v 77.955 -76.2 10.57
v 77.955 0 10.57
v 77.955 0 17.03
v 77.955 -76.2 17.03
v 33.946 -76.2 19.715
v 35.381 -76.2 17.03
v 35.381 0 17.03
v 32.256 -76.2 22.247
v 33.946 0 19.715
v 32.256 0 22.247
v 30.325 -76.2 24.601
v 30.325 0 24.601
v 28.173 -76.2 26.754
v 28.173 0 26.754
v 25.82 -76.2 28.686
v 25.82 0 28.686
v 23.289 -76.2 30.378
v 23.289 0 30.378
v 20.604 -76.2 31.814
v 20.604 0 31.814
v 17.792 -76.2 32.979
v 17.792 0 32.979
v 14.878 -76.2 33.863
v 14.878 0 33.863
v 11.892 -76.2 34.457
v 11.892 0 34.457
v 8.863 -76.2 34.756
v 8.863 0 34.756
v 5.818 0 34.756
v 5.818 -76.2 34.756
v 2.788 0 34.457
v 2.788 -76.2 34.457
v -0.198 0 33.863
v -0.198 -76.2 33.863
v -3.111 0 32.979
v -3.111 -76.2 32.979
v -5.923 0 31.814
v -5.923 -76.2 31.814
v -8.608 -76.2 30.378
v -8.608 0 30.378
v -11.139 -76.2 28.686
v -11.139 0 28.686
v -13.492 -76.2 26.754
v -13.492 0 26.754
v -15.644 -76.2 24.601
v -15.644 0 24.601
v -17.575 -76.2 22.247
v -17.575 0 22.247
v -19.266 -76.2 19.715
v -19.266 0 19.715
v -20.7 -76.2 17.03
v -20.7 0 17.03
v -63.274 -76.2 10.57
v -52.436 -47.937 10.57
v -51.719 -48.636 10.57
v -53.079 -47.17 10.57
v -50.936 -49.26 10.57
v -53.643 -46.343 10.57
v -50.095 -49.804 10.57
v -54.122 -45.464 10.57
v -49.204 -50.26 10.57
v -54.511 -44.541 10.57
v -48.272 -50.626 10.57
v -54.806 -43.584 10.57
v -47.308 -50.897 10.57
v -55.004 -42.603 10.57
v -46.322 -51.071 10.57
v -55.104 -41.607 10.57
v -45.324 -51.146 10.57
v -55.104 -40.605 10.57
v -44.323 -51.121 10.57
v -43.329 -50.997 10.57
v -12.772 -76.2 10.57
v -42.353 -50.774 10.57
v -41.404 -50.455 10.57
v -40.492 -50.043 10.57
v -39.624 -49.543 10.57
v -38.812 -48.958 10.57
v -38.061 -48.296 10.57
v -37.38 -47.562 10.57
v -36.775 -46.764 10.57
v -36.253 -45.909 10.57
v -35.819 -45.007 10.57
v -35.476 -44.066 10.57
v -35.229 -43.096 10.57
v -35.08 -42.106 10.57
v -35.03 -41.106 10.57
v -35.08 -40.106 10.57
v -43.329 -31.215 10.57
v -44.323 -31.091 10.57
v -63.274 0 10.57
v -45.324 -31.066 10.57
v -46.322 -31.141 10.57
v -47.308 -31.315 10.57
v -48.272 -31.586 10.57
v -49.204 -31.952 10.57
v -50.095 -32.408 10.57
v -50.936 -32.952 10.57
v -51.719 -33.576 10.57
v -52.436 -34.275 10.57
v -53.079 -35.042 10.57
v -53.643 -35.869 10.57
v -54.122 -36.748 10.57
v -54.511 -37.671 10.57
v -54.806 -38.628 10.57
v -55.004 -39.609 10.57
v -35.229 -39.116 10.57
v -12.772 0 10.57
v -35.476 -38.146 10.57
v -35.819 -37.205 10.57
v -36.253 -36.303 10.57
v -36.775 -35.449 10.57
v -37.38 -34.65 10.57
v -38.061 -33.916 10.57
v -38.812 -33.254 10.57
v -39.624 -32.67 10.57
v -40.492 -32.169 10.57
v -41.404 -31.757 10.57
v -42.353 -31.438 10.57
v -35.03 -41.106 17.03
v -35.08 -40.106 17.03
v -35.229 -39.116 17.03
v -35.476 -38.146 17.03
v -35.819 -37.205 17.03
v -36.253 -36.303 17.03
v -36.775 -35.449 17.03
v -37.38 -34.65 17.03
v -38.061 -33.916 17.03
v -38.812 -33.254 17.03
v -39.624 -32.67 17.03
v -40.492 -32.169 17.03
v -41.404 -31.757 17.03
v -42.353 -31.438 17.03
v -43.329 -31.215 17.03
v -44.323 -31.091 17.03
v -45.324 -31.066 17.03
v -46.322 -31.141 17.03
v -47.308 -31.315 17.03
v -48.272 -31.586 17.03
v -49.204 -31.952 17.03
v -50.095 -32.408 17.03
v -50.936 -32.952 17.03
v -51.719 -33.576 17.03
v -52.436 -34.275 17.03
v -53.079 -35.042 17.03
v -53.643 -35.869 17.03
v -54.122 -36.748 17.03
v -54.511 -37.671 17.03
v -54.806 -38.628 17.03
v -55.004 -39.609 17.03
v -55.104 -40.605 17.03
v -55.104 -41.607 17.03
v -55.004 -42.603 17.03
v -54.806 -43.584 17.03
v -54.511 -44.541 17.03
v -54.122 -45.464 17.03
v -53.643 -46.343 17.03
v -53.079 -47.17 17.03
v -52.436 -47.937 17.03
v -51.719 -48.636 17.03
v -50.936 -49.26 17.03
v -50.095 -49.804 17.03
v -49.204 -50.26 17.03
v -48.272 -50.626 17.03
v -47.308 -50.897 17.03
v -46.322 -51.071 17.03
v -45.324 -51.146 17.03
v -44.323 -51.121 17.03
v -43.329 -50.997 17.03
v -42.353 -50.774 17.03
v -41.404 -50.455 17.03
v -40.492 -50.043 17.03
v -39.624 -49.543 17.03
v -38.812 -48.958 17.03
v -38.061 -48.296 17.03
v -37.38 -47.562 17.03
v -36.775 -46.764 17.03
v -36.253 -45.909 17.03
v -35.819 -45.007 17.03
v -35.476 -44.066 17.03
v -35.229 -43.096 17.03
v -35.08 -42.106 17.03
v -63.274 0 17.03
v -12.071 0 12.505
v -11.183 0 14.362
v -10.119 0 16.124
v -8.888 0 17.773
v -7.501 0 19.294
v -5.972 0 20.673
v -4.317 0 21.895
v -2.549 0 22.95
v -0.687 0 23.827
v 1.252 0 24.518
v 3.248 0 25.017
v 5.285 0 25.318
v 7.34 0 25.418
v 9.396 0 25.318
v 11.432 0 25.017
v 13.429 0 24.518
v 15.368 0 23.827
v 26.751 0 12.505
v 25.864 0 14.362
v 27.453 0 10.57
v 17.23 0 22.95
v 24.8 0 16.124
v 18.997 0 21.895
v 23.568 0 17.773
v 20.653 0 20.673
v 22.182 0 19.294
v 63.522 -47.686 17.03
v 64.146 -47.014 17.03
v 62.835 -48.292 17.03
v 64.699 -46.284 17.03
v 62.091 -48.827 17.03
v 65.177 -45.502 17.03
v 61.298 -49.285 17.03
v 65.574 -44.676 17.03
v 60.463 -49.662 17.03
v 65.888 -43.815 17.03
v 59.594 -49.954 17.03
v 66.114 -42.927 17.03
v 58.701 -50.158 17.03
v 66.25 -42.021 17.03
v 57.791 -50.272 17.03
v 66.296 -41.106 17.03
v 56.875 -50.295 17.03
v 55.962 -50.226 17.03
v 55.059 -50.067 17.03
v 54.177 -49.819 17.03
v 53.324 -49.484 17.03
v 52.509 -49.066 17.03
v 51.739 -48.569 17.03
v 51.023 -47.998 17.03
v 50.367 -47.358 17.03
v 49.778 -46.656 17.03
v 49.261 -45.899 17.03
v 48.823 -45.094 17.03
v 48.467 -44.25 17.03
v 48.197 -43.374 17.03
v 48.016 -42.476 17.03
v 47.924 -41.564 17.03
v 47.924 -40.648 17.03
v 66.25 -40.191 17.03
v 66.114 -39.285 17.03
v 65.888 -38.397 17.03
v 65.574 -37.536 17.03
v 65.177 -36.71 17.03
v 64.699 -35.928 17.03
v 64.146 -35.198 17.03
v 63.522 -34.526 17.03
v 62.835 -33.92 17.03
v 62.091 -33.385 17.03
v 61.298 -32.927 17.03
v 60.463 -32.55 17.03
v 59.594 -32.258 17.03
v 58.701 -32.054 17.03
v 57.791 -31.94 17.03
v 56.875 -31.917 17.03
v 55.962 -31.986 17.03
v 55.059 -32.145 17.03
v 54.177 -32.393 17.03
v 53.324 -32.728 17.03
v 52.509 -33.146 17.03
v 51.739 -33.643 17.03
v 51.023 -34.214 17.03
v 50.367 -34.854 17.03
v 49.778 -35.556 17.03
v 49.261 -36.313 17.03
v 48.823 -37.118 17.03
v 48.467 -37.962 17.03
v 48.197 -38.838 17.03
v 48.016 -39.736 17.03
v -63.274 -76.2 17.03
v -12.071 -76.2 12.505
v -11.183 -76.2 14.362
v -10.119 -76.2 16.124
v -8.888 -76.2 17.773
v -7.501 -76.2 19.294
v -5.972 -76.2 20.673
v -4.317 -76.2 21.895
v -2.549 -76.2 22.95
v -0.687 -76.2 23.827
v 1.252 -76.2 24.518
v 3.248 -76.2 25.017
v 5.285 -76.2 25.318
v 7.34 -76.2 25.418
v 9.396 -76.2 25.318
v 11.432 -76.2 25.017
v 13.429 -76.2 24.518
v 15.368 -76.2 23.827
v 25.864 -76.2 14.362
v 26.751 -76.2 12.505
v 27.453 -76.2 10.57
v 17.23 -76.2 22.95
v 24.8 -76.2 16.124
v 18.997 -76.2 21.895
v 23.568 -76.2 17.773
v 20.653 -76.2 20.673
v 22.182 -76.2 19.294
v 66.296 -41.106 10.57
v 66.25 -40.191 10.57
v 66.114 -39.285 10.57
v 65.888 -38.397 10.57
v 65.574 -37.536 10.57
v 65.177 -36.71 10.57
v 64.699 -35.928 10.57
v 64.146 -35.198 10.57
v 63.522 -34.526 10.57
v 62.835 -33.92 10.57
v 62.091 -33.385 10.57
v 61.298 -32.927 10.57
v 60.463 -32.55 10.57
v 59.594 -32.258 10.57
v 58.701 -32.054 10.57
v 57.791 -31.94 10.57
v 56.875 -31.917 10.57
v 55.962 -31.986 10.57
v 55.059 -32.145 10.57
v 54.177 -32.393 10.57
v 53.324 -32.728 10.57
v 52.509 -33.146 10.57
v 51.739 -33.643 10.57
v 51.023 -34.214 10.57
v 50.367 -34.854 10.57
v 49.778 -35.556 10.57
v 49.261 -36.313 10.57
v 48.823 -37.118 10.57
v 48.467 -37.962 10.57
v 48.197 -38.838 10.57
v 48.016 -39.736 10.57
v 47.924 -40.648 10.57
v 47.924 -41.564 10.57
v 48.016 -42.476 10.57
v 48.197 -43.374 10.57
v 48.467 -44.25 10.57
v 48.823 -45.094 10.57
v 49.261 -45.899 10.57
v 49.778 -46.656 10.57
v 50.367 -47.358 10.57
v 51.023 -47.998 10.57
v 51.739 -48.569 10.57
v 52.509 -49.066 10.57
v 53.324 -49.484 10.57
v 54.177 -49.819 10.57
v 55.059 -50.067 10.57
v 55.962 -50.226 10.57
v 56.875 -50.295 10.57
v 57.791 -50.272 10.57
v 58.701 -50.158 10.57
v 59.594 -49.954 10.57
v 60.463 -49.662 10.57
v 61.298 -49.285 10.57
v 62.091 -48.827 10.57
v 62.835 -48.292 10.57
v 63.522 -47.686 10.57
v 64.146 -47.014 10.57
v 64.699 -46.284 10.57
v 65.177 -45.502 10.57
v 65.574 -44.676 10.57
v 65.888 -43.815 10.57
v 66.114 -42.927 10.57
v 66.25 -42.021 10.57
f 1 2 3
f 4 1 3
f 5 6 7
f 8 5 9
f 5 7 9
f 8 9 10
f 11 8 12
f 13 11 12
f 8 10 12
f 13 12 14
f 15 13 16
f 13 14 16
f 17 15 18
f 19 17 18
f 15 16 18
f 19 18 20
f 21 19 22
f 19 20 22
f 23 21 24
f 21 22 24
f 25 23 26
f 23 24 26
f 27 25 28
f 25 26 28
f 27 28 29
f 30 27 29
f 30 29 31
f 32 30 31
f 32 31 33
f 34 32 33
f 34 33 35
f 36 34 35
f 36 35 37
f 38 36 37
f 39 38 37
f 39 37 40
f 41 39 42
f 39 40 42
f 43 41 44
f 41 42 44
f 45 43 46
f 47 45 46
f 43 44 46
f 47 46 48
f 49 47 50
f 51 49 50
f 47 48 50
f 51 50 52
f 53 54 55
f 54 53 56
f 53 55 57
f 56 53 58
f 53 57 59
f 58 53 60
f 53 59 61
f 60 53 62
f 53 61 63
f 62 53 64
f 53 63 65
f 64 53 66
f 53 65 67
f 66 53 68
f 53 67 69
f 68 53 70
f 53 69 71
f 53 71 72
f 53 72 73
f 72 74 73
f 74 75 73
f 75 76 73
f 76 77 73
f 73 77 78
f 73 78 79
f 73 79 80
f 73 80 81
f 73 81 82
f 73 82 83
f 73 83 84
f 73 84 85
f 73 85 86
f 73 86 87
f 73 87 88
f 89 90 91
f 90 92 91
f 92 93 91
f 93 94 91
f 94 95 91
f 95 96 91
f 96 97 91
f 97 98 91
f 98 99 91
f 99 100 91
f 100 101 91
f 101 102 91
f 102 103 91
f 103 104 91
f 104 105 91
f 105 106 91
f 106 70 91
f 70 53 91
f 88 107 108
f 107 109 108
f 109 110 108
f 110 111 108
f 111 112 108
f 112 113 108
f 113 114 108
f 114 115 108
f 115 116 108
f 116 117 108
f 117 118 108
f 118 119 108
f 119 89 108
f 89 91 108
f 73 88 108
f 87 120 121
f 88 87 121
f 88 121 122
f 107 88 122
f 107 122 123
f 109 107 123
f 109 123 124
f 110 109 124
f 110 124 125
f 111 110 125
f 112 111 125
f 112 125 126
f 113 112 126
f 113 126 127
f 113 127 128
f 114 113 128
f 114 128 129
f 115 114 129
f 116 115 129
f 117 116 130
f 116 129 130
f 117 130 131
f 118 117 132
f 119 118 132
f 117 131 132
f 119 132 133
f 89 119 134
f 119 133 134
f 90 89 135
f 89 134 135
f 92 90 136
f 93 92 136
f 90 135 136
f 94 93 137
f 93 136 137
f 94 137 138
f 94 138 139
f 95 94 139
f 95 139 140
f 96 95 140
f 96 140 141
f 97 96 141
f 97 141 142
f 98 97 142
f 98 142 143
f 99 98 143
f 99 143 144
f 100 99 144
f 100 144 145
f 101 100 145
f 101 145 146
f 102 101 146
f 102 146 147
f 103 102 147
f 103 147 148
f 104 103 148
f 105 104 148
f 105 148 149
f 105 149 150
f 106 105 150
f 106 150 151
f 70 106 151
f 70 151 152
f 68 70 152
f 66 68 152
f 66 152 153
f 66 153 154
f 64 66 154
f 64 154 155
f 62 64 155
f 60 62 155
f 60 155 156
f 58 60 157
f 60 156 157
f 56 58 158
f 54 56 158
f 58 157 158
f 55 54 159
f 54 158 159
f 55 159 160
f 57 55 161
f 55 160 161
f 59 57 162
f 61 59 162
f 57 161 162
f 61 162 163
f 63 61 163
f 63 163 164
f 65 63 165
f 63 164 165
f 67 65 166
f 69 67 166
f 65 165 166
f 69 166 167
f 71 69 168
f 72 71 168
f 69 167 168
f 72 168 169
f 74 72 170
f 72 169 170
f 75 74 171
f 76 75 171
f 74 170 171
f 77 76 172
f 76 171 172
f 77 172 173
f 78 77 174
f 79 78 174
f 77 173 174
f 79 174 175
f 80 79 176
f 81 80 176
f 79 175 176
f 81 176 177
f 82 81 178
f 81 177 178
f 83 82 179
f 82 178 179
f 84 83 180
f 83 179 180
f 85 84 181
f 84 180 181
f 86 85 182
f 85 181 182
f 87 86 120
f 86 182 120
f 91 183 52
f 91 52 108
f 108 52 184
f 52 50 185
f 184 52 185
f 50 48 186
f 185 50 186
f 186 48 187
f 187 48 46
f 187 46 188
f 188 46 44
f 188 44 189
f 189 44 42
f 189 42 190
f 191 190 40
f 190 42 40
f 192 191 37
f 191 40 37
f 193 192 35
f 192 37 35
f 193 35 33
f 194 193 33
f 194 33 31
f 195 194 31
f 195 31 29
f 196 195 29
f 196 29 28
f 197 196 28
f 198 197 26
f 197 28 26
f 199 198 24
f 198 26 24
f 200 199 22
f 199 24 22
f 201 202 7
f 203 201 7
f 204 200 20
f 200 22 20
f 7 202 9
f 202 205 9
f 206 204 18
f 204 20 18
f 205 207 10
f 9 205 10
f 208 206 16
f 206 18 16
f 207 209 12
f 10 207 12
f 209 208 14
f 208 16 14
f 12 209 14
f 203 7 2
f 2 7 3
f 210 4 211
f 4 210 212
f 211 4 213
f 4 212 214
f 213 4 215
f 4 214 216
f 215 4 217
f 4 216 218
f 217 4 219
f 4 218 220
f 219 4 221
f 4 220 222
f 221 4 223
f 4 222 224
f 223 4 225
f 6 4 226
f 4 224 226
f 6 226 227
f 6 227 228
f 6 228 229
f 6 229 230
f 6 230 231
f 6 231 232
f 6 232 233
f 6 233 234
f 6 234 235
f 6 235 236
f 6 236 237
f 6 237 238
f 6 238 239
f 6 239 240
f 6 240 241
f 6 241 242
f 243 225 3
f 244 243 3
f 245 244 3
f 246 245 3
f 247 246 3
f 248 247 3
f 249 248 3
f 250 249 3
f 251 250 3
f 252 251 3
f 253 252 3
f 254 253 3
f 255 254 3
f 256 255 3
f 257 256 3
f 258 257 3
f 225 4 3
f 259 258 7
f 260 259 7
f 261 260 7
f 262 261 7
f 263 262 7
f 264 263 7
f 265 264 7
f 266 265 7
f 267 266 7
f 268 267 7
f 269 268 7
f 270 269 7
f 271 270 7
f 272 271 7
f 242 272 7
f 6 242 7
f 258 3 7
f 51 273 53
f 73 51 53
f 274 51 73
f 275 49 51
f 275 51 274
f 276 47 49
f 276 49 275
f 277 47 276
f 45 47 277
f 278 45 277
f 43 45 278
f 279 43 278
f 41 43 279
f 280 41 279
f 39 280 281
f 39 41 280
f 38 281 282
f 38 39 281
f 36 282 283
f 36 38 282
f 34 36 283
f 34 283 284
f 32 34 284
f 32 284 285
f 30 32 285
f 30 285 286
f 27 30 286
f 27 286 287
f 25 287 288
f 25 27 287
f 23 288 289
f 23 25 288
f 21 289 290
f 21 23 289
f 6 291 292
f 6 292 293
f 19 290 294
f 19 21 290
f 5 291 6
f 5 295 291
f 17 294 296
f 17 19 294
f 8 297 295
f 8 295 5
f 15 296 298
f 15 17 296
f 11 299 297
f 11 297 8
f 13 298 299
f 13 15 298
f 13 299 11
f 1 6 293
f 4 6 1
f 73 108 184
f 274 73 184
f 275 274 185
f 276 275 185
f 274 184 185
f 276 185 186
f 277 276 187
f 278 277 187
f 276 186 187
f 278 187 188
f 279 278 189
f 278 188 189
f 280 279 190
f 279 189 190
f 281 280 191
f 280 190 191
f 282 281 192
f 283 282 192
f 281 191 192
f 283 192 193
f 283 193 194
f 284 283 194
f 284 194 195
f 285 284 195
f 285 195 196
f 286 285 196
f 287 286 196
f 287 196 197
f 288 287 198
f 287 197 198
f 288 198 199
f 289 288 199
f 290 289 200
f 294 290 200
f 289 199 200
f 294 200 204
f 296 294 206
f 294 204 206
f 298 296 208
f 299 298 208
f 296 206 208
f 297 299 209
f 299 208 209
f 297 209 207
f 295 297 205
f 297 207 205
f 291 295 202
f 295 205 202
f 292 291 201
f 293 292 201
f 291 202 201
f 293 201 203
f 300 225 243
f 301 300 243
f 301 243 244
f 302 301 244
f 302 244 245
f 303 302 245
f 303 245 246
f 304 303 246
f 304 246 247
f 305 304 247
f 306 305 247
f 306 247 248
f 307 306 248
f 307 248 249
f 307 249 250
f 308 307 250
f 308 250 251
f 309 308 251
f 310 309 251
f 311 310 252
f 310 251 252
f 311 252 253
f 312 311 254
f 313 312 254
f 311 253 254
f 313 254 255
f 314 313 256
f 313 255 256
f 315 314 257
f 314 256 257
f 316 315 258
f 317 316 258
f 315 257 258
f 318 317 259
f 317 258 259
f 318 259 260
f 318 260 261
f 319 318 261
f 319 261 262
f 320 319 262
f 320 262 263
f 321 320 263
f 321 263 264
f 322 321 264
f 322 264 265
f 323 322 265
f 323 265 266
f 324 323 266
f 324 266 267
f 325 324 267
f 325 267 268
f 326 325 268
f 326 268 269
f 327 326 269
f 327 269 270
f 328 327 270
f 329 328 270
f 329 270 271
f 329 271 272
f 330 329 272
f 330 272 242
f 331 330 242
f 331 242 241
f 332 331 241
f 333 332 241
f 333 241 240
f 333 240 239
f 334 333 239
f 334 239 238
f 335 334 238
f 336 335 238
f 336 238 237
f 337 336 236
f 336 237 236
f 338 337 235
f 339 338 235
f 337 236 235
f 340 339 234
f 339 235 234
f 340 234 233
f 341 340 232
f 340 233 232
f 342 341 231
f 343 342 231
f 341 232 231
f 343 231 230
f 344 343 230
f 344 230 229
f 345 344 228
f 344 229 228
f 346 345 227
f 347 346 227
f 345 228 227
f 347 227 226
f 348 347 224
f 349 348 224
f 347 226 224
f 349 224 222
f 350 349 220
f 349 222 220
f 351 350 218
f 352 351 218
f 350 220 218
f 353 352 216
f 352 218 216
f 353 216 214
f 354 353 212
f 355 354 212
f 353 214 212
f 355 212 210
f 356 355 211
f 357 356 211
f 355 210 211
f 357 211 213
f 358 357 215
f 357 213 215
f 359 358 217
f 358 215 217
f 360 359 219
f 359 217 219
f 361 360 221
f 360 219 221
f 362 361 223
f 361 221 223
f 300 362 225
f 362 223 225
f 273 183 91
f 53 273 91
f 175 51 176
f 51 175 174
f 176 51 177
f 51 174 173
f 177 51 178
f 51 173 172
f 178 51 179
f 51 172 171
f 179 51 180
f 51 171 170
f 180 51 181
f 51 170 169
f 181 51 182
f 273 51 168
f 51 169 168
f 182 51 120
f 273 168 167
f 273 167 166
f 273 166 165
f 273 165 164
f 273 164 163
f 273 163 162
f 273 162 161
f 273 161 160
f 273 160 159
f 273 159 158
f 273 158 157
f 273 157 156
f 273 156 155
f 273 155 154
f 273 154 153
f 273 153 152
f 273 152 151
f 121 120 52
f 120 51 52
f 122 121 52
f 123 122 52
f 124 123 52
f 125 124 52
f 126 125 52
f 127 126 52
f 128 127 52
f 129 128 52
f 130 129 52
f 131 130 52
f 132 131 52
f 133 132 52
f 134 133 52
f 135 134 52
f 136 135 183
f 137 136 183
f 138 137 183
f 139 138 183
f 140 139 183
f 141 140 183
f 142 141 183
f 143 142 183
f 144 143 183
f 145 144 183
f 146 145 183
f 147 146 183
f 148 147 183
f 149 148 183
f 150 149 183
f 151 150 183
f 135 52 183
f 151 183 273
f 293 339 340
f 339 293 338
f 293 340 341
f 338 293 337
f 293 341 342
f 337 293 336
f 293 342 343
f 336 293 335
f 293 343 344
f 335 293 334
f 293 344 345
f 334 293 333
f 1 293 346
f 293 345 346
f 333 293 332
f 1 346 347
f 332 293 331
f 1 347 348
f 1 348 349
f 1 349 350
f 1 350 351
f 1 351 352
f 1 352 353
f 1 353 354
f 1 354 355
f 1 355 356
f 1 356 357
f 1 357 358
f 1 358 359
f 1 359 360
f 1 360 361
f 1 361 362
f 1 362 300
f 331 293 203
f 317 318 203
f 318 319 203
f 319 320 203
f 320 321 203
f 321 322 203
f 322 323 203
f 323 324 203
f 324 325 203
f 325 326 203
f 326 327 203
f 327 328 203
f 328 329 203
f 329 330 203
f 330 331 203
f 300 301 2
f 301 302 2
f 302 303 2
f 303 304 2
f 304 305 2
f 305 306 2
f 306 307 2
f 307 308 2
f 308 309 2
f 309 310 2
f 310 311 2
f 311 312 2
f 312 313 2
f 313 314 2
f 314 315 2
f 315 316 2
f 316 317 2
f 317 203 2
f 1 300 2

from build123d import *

# Parameters (mm, degrees)
F1_DEPTH = 76.2
F2_R     = 10.043167
F2_R_2   = 9.191604
F3_DEPTH = 25.4


with BuildPart() as f1:
    # F0 (on Front) → F1 (new body)
    with BuildSketch(Plane.XZ):
        with BuildLine():
            Line((-63.273966, 17.029652), (-63.273966, 10.570128))
            Line((-63.273966, 10.570128), (-12.772239, 10.570128))
            ThreePointArc((-12.772239, 10.570128), (7.340368, 25.418198), (27.452976, 10.570128))
            Line((27.452976, 10.570128), (77.954703, 10.570128))
            Line((77.954703, 10.570128), (77.954703, 17.029652))
            Line((77.954703, 17.029652), (35.380573, 17.029652))
            ThreePointArc((35.380573, 17.029652), (7.340368, 34.793164), (-20.699836, 17.029652))
            Line((-20.699836, 17.029652), (-63.273966, 17.029652))
        make_face()
    extrude(amount=F1_DEPTH)

    # F2 (on face) → F3 (cut)
    with BuildSketch(Plane.XY.offset(17.029652)):
        with Locations((-45.073345, -41.106056)):
            Circle(F2_R)
        with Locations((57.104558, -41.106056)):
            Circle(F2_R_2)
    extrude(amount=-F3_DEPTH, mode=Mode.SUBTRACT)


solid = f1.part
